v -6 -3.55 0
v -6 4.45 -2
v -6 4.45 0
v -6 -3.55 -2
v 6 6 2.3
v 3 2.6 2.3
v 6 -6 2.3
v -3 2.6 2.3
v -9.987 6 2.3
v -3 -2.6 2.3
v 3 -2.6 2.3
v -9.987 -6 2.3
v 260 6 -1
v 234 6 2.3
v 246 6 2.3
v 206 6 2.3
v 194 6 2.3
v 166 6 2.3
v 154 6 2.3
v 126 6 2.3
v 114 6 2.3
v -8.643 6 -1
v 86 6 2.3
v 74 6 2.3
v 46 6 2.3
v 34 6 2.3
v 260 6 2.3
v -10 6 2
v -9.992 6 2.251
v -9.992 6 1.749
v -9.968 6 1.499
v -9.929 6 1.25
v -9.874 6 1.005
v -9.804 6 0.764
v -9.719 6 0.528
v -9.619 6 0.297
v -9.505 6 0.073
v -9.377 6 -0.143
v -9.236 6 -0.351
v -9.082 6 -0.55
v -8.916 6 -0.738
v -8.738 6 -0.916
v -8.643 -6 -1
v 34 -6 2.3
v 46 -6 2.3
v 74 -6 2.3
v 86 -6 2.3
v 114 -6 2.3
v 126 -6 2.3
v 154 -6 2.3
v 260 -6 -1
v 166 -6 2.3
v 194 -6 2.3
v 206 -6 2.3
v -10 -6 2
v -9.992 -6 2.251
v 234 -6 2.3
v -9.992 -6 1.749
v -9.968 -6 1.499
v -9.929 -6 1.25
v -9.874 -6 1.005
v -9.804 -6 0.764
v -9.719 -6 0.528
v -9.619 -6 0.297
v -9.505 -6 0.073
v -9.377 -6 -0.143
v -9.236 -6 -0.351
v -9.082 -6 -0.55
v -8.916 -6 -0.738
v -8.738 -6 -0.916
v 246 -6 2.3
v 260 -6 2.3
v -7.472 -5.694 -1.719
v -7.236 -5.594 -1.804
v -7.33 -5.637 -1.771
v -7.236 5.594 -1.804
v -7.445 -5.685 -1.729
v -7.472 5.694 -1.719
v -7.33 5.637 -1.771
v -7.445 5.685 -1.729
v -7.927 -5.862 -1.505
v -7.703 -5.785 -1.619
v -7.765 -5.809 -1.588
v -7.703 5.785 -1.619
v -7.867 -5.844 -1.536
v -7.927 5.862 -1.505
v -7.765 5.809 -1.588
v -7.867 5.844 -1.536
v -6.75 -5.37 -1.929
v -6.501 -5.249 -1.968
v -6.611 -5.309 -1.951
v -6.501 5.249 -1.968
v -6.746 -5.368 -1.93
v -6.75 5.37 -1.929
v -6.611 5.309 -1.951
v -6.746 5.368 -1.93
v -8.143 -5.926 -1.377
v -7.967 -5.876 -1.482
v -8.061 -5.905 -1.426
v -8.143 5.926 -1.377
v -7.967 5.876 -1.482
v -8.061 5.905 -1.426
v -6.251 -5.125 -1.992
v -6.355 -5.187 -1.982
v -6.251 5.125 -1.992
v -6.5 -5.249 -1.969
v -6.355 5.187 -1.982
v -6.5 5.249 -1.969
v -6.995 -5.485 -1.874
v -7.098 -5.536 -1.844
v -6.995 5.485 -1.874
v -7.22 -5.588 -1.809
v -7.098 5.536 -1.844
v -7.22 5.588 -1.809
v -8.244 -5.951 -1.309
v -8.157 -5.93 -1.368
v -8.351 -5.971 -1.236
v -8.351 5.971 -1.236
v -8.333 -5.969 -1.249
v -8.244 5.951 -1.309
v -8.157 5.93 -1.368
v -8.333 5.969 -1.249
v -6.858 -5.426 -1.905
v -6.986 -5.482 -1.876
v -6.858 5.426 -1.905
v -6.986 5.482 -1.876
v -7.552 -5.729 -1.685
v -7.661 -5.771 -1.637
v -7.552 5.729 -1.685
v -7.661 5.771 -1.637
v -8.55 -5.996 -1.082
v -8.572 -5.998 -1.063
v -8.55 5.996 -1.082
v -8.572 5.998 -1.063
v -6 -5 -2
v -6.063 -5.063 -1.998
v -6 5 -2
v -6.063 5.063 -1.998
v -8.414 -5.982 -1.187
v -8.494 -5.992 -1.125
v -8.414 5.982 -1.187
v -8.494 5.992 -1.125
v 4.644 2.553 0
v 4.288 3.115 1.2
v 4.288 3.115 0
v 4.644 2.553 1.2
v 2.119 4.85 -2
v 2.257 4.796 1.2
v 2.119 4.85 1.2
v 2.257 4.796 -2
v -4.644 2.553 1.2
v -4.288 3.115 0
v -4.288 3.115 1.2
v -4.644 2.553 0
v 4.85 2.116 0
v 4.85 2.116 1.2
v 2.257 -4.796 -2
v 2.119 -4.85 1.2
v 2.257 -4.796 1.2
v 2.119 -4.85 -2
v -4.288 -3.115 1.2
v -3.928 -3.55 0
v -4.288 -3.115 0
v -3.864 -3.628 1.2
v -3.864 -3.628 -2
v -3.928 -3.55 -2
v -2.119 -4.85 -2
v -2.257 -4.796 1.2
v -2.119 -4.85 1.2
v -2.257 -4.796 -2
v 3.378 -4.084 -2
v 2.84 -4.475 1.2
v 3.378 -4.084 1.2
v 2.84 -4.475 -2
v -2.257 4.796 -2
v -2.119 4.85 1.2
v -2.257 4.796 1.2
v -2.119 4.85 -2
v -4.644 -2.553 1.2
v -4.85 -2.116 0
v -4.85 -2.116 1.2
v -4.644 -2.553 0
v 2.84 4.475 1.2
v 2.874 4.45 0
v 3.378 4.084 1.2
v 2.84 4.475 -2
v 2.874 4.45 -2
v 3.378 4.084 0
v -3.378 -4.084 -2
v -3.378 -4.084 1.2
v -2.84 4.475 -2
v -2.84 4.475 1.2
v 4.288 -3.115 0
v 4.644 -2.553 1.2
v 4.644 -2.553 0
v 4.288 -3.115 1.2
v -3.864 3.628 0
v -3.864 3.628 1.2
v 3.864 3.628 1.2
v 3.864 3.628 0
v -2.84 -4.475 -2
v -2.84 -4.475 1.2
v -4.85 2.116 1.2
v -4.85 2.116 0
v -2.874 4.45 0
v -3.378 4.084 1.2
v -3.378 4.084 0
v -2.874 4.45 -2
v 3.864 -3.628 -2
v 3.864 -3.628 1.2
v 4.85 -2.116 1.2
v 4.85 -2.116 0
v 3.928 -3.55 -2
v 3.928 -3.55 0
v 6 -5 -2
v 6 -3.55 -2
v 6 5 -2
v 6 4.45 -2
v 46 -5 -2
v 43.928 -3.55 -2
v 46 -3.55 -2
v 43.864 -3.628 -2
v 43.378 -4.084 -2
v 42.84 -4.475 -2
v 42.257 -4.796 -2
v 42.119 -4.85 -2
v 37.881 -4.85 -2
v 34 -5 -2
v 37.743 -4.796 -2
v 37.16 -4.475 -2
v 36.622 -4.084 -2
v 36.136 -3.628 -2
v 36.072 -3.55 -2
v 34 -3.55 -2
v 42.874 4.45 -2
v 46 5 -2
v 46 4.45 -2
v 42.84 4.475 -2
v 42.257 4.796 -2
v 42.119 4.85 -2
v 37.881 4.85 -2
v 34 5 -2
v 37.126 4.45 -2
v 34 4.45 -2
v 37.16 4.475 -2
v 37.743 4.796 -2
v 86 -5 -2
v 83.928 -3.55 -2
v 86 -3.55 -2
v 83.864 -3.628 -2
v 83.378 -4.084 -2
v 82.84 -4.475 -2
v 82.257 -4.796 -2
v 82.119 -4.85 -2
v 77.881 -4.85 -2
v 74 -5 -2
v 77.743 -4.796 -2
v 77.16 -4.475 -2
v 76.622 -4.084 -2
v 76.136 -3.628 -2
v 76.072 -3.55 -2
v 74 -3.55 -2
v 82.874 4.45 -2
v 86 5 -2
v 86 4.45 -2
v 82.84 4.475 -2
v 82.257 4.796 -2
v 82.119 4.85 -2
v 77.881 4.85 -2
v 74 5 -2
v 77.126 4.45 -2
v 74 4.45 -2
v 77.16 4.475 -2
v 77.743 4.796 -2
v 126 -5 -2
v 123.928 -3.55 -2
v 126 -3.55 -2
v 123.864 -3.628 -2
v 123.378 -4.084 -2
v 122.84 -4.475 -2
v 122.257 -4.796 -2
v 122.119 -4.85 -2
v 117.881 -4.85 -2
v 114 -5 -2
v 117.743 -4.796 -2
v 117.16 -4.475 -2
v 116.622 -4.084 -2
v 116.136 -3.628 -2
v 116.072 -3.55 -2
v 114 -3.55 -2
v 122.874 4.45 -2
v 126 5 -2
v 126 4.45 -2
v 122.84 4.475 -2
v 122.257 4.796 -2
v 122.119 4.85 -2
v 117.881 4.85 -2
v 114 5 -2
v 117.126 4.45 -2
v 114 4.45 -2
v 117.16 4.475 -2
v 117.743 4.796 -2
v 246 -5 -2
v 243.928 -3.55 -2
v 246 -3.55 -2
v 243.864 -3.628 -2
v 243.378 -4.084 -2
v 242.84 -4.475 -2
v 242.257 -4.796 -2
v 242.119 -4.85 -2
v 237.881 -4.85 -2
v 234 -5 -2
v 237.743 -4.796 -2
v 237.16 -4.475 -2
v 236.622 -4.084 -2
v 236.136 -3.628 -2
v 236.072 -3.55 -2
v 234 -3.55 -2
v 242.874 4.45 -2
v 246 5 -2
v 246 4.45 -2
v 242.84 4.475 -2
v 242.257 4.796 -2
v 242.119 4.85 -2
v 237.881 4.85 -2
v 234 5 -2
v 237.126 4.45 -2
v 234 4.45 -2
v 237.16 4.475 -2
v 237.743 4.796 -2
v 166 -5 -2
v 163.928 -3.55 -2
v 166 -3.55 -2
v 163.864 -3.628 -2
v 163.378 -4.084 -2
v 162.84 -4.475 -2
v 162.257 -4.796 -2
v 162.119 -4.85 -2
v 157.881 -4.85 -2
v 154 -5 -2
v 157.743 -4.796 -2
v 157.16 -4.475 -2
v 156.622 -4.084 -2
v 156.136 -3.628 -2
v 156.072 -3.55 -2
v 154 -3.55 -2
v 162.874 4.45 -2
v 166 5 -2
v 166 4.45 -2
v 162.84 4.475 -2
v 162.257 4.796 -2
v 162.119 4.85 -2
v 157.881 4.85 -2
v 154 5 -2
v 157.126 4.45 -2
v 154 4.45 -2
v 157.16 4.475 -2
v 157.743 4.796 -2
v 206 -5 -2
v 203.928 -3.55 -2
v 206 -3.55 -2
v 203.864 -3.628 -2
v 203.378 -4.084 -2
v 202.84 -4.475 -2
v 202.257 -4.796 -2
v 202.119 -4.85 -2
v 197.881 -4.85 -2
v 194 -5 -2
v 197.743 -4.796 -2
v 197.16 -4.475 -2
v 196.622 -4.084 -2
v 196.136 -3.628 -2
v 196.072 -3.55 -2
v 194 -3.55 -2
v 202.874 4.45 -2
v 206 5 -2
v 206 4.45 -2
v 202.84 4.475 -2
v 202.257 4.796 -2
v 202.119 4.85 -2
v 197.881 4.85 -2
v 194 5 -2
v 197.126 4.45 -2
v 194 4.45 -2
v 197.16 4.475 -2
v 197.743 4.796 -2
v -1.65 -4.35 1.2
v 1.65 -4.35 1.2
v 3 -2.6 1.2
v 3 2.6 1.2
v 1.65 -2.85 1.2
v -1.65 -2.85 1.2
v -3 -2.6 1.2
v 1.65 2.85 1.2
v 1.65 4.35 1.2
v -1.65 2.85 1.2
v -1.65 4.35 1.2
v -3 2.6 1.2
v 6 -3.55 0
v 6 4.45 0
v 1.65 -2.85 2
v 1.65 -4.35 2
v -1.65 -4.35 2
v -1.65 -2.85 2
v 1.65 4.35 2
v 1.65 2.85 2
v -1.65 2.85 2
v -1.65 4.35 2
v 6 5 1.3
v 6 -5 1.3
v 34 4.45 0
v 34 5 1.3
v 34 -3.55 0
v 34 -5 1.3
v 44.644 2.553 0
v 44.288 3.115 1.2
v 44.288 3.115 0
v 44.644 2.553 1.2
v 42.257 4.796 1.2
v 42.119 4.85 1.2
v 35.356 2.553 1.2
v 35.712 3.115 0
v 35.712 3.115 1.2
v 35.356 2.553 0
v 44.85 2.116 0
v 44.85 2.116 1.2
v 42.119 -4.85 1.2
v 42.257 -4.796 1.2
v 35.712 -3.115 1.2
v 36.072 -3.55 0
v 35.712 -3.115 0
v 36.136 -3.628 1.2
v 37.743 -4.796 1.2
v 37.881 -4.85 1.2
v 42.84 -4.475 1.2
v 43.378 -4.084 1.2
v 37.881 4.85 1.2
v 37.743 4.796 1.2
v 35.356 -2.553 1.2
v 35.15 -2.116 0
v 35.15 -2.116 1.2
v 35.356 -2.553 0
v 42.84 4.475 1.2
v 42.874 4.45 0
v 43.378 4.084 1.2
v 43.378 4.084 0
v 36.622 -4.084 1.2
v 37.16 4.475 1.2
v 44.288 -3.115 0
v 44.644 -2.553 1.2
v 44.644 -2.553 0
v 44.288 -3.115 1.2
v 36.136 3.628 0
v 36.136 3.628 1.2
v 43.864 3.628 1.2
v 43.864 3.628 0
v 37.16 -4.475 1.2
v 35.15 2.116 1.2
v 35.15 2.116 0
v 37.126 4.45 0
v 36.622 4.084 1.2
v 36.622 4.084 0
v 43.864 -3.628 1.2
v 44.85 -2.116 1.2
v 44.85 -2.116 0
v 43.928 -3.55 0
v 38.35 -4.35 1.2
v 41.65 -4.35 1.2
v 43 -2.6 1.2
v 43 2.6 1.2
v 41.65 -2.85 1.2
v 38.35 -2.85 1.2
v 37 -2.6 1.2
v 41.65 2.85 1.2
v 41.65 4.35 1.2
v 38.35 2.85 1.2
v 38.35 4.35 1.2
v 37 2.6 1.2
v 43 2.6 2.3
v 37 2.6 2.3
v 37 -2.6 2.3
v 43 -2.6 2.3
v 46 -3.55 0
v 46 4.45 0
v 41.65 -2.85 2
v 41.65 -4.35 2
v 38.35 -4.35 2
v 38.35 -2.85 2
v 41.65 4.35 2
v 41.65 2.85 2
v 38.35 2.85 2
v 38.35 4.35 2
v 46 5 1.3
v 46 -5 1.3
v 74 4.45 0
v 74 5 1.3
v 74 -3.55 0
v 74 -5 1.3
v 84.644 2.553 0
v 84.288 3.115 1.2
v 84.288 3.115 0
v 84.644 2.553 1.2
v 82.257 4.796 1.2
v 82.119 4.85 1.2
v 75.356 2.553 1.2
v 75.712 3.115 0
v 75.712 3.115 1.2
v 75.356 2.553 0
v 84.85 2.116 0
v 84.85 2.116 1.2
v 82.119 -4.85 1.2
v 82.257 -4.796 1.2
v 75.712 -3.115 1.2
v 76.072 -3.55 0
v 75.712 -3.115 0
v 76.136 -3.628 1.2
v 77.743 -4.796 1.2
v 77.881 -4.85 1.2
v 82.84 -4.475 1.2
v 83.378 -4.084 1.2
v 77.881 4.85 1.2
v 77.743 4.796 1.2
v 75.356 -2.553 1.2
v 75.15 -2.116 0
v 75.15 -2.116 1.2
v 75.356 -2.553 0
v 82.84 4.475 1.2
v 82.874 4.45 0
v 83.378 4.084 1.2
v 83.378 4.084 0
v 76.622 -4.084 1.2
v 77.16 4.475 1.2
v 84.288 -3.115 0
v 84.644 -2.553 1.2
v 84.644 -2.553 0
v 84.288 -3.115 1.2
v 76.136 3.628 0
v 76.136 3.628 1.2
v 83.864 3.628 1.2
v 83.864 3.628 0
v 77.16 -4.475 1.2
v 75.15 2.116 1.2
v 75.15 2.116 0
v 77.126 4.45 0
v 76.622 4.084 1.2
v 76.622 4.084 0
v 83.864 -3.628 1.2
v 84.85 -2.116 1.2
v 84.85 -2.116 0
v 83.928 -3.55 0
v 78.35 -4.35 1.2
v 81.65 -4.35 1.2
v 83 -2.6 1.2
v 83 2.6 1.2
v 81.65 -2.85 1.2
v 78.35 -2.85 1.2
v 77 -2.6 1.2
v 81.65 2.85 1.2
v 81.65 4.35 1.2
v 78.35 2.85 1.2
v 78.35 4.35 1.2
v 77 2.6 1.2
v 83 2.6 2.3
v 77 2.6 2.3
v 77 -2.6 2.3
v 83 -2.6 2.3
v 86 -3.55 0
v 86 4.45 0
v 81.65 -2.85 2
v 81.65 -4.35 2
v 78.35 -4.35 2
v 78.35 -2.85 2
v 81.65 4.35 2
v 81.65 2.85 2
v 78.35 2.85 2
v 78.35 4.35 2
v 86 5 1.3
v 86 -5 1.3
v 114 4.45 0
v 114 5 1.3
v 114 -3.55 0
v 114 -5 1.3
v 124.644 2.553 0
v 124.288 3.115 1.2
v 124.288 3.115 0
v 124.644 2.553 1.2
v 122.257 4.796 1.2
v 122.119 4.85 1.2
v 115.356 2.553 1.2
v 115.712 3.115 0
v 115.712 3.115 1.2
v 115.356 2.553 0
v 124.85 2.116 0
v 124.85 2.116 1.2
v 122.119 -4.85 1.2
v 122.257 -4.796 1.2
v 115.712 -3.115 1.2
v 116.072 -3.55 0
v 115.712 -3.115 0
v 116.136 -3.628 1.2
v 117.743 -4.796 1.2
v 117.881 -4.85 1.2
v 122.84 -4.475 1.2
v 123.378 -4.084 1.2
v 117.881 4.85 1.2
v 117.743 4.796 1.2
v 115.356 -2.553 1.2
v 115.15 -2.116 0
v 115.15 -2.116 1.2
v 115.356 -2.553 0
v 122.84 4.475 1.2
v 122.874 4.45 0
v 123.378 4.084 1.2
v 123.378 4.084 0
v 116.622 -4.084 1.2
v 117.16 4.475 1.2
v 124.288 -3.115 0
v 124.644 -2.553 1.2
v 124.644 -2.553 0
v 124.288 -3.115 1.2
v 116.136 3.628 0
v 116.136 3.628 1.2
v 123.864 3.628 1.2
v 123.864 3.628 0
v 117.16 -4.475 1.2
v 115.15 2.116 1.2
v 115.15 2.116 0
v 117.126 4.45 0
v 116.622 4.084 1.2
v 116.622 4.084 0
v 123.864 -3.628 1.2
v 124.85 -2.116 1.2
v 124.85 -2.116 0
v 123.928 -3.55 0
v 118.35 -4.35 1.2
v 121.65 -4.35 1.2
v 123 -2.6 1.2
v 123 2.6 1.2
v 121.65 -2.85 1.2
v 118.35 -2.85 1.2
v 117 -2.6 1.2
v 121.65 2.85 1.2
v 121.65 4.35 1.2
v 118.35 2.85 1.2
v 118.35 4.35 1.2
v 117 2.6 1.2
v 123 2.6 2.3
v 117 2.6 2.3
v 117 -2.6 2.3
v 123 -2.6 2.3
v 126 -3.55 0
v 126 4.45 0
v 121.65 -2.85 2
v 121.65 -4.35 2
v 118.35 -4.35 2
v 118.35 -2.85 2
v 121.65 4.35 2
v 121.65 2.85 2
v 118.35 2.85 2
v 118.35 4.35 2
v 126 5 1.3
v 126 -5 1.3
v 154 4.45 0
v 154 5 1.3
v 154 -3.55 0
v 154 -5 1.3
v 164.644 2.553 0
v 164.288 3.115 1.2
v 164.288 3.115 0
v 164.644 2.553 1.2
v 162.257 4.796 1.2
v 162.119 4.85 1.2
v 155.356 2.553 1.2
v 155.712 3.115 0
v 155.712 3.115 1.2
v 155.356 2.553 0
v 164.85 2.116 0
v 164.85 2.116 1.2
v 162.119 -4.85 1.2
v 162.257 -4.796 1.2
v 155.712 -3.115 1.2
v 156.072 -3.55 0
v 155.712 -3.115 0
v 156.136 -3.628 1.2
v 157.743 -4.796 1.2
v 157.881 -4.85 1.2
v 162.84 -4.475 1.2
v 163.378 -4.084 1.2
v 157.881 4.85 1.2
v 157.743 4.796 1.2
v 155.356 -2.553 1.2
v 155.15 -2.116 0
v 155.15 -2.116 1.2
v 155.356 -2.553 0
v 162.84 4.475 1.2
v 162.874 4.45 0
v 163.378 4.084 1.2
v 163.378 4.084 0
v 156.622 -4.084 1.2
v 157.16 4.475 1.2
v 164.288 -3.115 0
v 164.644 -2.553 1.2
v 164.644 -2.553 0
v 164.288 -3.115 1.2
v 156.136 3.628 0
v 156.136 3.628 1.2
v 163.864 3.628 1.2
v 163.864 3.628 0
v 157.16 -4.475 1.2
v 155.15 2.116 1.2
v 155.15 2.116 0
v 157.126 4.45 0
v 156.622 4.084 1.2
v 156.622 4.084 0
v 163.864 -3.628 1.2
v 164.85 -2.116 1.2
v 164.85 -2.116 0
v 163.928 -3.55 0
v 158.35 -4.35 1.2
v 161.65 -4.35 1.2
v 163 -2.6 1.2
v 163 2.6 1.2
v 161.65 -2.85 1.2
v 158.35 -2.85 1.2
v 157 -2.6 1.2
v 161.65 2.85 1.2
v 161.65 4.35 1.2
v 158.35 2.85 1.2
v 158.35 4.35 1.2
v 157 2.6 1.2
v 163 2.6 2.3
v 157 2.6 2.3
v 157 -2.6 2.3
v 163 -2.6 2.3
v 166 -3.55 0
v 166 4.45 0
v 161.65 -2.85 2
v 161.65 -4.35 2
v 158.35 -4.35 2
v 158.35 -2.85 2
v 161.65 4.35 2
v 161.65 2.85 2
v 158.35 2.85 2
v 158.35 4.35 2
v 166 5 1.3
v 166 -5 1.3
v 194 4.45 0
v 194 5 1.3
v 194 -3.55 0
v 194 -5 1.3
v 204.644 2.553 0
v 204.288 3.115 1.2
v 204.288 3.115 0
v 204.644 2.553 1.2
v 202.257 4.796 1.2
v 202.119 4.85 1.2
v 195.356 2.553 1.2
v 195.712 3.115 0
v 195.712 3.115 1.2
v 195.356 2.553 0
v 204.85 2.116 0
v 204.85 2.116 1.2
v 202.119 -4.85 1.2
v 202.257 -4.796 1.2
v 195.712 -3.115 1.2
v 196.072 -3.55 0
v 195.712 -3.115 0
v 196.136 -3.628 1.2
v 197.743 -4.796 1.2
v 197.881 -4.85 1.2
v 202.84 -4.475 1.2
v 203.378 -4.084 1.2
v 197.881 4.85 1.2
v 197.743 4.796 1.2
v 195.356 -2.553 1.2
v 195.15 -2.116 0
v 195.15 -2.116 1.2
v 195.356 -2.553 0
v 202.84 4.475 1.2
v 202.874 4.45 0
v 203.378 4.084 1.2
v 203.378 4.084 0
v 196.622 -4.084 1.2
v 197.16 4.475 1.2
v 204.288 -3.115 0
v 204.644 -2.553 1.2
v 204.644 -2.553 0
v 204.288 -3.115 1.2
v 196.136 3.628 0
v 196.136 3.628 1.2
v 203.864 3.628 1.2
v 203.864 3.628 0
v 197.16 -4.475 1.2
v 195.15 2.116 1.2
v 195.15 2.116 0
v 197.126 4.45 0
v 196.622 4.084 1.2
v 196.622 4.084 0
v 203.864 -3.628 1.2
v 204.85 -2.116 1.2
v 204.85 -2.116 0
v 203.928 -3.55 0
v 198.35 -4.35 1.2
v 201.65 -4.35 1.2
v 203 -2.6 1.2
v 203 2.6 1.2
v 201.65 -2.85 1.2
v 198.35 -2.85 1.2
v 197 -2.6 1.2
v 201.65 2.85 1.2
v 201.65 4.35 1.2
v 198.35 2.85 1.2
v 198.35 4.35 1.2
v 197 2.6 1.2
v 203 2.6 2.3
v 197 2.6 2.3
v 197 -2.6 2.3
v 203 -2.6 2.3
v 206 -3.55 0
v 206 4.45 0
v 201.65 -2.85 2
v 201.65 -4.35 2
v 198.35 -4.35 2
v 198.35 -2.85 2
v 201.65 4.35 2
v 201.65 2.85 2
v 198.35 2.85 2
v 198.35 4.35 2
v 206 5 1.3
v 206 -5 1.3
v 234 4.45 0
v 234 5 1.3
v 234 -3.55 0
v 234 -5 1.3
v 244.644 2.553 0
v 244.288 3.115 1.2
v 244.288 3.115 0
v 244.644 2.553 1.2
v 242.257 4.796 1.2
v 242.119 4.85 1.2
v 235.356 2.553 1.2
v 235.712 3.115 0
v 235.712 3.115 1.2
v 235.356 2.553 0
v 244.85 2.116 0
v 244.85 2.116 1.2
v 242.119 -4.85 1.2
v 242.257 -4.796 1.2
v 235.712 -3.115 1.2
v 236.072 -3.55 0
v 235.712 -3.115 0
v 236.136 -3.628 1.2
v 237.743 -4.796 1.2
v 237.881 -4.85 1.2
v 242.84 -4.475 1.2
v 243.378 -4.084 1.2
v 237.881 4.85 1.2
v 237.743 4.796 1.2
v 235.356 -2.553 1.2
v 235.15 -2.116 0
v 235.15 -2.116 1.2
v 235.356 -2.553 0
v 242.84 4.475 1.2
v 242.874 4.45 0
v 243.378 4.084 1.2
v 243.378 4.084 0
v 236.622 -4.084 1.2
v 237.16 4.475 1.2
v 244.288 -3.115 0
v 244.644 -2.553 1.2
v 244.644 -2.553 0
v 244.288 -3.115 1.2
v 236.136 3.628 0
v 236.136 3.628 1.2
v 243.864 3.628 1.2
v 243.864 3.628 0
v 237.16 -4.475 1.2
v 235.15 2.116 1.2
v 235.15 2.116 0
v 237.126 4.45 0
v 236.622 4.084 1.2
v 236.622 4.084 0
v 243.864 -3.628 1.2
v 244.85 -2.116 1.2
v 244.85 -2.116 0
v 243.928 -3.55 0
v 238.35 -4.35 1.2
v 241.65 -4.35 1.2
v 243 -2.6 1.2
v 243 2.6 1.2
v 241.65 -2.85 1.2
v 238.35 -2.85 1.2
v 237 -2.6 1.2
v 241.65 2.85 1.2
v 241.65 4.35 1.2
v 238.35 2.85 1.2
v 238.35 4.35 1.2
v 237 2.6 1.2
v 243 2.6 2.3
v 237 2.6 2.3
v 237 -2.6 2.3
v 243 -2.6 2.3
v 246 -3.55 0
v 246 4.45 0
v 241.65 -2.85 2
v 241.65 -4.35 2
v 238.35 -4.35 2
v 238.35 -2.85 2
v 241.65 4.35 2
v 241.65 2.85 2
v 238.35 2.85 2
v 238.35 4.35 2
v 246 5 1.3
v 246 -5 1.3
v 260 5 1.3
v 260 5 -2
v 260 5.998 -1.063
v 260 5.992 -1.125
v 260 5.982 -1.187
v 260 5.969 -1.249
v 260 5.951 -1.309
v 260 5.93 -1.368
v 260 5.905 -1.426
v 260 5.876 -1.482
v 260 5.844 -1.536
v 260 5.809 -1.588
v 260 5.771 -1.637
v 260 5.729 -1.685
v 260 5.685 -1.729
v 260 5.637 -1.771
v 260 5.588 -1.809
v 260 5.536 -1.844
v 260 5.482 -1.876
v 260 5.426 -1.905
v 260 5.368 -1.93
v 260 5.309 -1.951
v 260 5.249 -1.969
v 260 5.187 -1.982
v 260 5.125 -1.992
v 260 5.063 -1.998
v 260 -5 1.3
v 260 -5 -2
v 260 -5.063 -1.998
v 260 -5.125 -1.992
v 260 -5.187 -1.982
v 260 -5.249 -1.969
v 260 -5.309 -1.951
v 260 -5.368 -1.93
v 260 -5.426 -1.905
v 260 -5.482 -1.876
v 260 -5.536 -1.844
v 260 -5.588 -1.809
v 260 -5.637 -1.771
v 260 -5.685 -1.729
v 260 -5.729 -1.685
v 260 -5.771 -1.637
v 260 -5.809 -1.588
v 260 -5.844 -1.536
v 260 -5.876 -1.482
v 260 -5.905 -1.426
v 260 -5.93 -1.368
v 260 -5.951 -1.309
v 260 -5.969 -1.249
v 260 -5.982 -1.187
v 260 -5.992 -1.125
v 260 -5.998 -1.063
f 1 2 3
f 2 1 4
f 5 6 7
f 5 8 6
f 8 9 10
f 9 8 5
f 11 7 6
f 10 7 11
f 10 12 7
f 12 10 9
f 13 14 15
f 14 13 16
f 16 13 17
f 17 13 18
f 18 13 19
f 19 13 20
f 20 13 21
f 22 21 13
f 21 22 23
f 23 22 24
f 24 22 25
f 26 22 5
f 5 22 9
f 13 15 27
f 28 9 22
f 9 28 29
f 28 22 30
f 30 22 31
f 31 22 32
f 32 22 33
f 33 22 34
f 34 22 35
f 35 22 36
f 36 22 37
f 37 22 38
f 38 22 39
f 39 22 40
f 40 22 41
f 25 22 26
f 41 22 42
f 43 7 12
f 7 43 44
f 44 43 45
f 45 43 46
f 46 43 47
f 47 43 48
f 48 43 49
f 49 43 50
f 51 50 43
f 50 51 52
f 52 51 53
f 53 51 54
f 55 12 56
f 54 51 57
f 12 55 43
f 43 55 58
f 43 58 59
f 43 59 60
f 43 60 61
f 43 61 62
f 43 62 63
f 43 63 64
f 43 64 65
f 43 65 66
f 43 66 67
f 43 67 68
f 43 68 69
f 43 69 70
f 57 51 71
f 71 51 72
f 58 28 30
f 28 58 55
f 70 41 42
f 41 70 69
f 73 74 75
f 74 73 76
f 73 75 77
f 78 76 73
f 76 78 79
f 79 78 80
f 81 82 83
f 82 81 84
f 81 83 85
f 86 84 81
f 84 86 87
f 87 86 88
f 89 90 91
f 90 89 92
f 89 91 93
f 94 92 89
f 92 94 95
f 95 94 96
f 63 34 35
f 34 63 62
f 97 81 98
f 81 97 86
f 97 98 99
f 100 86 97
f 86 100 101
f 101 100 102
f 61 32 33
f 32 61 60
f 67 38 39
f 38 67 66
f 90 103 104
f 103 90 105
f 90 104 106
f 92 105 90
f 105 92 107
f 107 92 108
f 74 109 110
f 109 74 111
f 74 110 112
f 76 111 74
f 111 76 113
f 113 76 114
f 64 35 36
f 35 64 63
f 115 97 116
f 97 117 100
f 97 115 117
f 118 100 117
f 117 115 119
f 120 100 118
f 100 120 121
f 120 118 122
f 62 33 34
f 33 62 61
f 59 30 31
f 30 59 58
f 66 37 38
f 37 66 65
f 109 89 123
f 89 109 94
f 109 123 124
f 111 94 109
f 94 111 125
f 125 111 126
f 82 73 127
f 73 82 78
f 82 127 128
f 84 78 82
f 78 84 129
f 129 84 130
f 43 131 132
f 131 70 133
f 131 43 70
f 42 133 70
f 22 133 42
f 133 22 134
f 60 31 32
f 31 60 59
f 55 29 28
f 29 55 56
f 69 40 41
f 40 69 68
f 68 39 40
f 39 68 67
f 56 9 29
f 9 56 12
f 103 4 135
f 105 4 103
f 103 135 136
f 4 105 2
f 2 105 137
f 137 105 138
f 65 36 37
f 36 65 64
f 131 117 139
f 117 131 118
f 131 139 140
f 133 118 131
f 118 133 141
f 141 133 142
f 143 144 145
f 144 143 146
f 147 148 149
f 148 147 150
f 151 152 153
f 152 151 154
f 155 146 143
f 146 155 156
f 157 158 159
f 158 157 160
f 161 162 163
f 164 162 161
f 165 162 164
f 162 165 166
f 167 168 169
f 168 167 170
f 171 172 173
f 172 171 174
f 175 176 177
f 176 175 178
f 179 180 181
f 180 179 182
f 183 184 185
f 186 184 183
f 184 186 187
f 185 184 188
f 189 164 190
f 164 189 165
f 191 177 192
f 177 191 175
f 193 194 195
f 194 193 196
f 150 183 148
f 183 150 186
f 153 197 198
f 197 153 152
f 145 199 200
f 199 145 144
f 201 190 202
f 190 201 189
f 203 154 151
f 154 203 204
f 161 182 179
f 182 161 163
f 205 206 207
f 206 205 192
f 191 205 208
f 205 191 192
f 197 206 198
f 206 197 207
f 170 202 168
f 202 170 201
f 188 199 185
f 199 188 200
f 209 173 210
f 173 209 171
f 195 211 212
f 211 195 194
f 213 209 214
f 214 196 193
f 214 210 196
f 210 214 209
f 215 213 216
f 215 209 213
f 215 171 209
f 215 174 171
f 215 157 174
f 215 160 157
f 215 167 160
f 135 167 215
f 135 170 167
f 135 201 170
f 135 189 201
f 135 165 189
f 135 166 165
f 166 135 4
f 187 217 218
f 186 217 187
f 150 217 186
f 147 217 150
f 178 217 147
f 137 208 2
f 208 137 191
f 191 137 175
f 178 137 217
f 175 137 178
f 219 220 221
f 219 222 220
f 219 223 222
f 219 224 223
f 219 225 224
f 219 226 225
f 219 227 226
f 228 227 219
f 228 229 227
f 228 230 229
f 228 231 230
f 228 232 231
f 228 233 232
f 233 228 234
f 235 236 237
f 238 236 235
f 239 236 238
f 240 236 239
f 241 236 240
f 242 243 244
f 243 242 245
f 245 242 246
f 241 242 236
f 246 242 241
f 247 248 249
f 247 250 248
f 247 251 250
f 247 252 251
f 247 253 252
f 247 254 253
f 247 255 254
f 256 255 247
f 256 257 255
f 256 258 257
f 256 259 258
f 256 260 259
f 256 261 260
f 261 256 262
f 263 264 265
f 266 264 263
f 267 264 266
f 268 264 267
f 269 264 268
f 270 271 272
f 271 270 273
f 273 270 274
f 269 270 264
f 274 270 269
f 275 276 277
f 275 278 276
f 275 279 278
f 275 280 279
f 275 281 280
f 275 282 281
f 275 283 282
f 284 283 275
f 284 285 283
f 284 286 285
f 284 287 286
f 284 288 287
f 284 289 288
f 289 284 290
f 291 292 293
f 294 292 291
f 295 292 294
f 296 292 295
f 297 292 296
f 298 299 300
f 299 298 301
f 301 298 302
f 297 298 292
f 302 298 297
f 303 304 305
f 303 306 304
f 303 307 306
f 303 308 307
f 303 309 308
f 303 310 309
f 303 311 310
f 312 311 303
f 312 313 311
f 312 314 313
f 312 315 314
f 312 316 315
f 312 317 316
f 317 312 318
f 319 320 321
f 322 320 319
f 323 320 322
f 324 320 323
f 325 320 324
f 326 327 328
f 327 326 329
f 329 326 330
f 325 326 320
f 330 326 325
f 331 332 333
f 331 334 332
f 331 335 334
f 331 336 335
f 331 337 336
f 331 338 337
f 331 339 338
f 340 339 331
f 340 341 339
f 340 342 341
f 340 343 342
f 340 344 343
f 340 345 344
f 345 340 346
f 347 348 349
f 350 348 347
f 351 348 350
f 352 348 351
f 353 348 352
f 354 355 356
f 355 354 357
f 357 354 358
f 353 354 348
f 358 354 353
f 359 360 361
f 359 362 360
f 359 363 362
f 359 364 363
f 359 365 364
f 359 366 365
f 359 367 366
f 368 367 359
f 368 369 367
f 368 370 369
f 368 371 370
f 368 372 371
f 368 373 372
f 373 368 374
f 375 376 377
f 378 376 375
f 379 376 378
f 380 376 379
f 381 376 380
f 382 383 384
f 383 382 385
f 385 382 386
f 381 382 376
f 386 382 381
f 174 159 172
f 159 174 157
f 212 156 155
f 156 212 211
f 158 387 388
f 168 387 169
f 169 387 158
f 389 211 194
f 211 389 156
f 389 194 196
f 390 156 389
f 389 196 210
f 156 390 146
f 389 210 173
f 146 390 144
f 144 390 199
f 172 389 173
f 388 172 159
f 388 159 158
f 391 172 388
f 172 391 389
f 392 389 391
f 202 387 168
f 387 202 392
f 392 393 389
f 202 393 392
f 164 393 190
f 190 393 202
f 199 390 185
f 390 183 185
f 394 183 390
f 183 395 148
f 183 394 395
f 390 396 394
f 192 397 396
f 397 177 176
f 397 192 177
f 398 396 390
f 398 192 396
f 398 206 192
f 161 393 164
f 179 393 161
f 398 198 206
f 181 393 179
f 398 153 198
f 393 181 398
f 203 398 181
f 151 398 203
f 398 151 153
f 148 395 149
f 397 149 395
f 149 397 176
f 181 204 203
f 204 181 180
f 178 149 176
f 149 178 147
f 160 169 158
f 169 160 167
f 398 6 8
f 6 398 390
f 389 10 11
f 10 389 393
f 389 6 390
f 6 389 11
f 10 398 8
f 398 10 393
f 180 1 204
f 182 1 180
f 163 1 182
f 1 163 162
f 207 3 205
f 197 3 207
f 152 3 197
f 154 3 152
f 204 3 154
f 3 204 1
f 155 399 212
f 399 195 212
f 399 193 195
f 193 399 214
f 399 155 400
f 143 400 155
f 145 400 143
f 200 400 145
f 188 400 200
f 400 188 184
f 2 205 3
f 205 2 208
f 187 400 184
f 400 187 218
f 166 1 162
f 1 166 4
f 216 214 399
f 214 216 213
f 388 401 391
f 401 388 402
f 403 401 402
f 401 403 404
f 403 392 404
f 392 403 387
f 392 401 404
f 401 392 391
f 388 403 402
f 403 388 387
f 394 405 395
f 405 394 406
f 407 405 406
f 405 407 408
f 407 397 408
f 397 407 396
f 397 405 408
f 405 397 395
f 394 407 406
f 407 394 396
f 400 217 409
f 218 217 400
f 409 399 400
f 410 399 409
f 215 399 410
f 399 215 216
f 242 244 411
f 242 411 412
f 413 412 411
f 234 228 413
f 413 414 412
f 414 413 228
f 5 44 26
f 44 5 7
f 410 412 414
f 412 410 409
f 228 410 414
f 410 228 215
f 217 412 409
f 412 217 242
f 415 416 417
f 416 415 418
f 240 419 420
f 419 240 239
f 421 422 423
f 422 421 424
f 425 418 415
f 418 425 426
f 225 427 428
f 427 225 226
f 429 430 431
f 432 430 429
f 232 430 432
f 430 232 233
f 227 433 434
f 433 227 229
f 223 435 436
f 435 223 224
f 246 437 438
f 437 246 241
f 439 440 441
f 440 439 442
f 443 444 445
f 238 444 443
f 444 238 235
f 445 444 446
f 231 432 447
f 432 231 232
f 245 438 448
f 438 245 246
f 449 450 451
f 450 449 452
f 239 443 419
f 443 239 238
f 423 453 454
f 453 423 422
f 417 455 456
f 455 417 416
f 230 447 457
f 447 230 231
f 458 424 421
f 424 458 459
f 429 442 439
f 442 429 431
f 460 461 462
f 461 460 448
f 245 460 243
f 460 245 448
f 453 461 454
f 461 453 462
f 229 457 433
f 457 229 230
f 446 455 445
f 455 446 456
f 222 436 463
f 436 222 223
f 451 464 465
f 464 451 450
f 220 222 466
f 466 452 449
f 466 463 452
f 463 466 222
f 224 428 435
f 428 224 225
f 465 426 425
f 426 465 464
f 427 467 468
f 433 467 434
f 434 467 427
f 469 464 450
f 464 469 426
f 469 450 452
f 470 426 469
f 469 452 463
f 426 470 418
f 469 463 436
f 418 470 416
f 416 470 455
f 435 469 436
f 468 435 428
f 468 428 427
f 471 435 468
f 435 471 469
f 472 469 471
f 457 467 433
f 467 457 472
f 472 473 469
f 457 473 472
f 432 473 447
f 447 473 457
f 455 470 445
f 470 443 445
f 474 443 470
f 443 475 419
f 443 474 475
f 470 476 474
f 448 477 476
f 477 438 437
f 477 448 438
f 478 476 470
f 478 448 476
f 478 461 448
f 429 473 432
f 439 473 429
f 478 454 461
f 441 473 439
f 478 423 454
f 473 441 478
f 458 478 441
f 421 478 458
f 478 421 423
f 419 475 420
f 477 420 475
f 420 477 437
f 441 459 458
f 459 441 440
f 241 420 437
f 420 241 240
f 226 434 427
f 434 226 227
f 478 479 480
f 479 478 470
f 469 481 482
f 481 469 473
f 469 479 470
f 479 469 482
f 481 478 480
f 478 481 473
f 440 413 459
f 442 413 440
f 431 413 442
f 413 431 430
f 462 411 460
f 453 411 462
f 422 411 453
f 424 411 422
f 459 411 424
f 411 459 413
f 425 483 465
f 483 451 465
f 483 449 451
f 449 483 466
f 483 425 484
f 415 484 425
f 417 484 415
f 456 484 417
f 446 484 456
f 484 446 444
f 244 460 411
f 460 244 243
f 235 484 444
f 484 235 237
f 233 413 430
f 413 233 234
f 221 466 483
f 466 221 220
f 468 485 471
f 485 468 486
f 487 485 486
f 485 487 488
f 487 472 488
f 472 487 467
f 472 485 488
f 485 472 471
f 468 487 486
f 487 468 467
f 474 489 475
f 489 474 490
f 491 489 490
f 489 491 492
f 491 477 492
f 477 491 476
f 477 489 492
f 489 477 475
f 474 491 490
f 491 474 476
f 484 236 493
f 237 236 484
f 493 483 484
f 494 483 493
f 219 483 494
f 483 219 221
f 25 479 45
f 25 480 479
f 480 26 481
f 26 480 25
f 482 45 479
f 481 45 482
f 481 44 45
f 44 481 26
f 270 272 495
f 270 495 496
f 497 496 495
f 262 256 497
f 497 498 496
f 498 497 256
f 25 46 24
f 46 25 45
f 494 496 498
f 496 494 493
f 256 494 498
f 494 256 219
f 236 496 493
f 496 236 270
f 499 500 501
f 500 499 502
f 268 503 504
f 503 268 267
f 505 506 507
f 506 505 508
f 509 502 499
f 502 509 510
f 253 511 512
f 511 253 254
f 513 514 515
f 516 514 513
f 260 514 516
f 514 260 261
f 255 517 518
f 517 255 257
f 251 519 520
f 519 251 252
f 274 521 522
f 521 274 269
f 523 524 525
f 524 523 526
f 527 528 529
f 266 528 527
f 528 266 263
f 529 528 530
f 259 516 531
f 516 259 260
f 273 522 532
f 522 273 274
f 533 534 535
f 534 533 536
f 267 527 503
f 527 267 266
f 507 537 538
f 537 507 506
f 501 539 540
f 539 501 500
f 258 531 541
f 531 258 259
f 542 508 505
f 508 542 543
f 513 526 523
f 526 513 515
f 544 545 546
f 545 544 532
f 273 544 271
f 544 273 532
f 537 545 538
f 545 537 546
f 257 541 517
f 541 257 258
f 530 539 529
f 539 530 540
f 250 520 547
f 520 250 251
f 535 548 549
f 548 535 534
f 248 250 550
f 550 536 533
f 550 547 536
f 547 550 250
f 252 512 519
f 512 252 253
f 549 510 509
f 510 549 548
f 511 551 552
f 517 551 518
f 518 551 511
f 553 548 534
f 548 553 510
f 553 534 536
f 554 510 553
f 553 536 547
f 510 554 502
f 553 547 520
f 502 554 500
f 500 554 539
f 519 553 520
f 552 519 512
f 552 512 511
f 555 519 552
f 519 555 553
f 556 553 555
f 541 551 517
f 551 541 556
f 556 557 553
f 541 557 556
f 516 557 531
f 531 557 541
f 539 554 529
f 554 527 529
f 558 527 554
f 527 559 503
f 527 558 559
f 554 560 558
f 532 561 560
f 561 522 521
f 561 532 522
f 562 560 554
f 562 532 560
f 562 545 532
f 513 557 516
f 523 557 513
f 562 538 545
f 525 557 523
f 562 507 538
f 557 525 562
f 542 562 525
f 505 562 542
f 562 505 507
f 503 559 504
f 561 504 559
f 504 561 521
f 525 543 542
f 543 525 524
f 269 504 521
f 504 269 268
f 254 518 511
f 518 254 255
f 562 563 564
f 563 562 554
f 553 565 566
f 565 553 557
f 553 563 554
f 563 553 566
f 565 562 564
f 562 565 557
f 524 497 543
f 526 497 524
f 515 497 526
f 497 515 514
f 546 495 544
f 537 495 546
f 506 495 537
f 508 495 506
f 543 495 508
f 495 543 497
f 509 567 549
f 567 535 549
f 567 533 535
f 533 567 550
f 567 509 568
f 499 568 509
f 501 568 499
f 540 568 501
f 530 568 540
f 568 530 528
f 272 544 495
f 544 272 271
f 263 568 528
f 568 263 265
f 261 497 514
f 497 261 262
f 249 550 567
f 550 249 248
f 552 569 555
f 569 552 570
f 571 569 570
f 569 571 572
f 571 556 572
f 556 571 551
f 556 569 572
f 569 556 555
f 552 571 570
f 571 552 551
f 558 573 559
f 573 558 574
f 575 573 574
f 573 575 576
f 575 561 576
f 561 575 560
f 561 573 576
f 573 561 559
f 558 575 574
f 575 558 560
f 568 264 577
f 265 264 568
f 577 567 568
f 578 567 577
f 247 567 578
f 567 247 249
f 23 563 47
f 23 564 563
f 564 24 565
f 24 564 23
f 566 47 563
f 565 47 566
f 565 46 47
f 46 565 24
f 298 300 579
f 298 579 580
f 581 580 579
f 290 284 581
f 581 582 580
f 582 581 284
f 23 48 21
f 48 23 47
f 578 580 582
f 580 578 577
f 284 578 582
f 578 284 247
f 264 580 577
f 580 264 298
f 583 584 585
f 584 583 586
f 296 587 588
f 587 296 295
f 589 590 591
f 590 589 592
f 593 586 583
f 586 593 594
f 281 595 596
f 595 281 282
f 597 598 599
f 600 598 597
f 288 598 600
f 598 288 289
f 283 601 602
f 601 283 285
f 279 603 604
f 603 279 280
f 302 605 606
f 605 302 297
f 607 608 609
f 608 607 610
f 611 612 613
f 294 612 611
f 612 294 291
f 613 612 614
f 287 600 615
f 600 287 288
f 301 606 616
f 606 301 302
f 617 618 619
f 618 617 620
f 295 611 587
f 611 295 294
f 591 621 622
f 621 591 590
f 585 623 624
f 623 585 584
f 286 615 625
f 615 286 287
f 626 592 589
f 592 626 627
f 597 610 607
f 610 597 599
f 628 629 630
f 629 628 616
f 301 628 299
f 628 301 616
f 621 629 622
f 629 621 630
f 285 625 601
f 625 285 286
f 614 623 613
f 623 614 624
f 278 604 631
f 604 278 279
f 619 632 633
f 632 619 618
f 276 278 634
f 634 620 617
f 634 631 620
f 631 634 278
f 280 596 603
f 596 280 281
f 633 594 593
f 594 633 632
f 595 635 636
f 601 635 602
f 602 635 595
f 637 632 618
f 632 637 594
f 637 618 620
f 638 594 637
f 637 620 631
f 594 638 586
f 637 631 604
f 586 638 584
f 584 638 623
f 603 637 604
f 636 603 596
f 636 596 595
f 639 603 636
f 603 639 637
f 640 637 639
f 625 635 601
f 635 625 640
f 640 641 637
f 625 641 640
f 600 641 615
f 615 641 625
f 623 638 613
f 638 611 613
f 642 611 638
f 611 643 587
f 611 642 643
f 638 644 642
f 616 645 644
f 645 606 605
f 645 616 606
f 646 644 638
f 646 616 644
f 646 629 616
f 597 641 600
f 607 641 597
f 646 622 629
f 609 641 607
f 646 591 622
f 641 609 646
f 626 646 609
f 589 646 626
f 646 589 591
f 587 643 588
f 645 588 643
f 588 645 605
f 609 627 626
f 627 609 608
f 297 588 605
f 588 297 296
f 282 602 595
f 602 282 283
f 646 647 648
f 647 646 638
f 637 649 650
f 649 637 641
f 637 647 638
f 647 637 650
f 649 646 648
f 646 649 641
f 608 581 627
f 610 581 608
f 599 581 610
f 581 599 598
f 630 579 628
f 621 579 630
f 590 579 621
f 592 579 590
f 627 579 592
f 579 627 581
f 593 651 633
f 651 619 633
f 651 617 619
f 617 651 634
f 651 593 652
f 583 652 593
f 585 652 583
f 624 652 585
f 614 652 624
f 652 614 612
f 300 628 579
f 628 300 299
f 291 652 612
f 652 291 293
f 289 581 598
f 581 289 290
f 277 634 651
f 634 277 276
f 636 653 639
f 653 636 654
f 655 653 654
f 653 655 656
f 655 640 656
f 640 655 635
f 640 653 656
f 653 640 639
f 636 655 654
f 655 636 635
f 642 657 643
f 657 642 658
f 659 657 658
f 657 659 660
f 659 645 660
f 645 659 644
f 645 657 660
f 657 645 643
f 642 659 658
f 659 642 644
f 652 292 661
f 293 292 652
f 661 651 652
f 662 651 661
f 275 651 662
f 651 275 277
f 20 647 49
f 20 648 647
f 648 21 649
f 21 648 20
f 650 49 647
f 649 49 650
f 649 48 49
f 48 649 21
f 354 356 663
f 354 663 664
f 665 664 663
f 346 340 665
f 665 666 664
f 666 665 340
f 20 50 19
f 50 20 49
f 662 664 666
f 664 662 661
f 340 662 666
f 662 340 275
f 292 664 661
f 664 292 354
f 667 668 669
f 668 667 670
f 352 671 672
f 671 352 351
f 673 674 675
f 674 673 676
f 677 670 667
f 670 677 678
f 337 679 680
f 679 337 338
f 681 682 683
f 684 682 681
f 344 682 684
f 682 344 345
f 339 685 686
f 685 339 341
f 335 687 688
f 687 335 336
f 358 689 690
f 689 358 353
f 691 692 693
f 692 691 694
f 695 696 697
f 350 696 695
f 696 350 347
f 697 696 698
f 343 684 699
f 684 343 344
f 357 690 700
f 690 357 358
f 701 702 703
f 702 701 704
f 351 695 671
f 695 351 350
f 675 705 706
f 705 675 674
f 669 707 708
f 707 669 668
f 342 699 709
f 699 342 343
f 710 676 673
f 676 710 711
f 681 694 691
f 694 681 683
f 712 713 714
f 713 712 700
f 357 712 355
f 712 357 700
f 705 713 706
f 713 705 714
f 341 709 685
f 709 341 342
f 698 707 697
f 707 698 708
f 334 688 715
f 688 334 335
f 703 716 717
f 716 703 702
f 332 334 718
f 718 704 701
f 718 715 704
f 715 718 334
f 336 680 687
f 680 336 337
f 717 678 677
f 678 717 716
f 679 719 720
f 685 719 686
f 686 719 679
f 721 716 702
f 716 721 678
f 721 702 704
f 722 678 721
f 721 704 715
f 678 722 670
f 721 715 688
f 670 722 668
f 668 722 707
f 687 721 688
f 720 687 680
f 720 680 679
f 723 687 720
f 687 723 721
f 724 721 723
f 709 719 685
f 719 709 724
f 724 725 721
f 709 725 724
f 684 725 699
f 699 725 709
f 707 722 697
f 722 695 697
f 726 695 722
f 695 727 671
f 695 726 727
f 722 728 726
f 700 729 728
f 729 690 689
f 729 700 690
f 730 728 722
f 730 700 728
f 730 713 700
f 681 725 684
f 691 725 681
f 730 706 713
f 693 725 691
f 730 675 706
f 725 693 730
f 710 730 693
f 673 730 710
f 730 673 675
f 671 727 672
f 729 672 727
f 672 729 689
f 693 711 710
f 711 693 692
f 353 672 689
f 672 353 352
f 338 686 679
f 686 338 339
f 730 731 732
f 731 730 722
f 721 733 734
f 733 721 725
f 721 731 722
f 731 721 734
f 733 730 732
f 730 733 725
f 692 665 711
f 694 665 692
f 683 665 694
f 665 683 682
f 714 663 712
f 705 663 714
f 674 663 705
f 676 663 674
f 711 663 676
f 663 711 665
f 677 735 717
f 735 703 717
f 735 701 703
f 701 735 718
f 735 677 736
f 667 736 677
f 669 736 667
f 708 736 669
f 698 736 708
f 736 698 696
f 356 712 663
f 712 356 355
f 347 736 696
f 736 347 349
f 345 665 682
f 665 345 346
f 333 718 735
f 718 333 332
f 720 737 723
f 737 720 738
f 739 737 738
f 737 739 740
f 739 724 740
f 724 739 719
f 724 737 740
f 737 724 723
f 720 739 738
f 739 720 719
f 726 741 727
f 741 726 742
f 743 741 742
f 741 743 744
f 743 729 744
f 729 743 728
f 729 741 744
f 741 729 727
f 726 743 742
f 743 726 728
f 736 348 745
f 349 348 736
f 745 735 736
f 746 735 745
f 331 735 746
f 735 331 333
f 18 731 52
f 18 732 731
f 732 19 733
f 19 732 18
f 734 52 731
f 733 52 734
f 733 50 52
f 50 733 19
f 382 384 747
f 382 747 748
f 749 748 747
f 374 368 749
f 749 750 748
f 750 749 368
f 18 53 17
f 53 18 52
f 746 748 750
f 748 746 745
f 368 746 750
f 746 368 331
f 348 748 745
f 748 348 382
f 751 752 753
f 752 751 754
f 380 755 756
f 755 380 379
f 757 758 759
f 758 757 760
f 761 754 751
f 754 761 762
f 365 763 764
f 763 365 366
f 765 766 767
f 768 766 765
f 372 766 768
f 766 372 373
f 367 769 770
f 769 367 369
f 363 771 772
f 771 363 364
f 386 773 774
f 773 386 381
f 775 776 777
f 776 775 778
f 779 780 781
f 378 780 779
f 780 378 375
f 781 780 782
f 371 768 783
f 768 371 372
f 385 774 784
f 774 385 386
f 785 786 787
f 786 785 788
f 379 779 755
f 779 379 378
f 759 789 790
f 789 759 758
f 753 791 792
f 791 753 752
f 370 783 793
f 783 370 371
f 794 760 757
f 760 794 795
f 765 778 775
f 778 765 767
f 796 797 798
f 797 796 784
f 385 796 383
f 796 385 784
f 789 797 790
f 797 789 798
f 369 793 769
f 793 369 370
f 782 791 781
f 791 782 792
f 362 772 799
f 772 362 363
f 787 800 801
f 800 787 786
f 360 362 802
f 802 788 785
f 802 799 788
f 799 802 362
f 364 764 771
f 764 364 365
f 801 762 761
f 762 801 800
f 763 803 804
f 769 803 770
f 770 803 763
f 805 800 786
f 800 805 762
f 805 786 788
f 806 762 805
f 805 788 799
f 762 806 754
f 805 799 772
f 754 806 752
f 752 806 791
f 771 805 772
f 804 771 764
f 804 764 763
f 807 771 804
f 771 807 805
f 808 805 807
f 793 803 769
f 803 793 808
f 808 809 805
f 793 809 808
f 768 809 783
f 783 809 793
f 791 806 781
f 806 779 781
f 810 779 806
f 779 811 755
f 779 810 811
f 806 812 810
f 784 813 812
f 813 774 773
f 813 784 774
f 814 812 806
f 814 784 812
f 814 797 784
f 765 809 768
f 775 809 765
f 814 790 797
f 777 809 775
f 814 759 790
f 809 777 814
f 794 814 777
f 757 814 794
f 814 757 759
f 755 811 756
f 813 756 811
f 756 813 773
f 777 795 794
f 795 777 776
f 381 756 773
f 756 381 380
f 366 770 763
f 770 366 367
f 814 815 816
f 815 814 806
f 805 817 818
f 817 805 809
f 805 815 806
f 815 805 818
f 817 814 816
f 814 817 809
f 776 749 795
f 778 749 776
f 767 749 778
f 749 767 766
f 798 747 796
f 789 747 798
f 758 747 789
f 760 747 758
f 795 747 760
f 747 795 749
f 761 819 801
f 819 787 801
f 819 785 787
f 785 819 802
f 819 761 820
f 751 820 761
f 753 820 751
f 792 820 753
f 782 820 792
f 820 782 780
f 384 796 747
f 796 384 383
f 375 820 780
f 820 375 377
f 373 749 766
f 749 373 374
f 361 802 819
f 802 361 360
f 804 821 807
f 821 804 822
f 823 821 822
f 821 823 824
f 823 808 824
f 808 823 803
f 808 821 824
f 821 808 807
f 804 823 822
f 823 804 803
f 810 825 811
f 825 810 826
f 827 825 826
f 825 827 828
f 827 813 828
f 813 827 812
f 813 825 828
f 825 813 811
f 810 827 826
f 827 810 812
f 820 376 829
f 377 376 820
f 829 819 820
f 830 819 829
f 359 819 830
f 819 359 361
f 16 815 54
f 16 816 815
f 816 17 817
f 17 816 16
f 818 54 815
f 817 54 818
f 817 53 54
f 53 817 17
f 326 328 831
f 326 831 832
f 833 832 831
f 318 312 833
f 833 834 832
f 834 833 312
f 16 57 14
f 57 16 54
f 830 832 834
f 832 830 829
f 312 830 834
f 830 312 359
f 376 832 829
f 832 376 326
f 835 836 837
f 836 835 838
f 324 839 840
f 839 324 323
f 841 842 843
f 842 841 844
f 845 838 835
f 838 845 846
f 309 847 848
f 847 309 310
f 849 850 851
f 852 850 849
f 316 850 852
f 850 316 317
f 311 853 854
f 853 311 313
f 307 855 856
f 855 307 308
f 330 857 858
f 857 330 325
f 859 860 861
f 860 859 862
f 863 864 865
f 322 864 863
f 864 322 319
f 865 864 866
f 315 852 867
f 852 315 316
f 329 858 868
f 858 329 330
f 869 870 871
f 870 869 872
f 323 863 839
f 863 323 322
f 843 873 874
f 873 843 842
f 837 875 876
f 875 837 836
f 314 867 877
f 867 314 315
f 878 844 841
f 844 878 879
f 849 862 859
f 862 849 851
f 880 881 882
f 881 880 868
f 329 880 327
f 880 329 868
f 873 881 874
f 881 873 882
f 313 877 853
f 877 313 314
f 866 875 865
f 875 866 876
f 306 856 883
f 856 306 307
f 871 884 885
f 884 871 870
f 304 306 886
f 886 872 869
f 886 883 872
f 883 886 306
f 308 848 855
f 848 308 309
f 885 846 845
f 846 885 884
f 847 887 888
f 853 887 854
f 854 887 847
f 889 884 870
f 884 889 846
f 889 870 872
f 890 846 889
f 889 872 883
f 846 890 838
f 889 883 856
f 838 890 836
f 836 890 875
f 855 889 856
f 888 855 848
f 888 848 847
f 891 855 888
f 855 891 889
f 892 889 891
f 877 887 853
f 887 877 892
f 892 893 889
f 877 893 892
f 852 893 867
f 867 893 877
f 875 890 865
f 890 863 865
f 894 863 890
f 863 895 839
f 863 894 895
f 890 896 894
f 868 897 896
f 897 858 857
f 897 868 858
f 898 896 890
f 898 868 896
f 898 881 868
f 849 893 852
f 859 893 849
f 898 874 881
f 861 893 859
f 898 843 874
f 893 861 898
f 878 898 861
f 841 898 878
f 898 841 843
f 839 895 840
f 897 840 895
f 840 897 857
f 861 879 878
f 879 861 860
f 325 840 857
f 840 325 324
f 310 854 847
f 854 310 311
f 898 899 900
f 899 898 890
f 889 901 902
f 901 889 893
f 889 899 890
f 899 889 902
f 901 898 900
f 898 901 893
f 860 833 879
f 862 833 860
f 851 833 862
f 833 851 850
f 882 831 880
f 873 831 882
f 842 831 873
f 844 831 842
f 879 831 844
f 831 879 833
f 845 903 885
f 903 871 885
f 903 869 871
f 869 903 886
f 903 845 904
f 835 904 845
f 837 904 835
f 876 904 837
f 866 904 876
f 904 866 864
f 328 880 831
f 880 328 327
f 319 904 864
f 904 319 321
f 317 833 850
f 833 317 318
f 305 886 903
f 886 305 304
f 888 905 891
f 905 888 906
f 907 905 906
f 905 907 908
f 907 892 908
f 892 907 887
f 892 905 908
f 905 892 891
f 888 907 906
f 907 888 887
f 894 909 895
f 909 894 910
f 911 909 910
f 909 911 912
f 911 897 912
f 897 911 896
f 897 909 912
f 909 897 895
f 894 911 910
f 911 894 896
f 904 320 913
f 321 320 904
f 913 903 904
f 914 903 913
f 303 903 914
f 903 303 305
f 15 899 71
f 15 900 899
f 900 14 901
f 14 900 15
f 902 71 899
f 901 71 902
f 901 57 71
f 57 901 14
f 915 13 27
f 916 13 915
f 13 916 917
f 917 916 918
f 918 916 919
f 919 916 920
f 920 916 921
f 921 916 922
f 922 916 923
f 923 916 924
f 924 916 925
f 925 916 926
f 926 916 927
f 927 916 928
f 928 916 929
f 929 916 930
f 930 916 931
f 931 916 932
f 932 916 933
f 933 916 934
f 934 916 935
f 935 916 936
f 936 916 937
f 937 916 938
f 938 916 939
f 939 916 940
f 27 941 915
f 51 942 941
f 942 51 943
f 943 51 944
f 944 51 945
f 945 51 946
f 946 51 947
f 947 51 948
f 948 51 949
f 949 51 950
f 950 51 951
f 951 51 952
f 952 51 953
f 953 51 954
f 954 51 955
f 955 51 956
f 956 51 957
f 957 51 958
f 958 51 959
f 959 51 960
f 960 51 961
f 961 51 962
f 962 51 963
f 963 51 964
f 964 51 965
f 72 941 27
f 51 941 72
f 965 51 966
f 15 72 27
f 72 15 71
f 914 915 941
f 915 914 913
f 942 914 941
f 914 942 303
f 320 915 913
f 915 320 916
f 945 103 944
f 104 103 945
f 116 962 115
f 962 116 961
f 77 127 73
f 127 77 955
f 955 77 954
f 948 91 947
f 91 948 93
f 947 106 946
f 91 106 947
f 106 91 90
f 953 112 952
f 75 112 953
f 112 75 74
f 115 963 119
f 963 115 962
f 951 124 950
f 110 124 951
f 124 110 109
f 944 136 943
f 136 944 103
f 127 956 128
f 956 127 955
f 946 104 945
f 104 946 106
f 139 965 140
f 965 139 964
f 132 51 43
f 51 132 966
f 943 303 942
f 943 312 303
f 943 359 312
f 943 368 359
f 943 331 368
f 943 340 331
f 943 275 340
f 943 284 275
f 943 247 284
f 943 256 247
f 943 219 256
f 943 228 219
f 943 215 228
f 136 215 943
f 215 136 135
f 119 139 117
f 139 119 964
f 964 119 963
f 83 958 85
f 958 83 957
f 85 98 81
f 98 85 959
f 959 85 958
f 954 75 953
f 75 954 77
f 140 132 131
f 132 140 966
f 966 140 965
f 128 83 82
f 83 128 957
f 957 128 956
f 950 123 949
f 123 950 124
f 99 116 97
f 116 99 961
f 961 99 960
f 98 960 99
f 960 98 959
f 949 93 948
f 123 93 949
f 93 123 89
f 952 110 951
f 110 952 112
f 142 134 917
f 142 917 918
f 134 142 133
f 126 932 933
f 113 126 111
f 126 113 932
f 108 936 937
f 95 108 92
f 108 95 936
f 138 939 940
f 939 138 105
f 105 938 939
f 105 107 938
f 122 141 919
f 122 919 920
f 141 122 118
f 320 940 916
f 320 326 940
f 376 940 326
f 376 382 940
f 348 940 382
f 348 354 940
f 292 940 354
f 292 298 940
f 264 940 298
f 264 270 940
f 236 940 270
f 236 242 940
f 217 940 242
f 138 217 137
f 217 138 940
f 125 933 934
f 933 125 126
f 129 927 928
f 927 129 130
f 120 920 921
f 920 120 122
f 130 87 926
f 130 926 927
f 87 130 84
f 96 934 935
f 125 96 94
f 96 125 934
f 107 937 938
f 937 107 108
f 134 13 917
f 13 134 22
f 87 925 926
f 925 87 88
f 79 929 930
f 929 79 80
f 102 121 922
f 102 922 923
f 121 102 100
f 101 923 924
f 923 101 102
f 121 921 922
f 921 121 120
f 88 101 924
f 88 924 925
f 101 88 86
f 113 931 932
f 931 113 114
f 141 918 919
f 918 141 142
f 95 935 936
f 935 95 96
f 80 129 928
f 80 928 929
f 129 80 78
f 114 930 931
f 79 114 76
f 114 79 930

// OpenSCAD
// A tray you can push those little Neopixel circut boards into
// see https://kigyui.com/ledskirt/

// This is a postive of the circuit board of a ws2812
module ws2812() {
    translate ([-9.7/2,-9.7/2,0]) { 
        intersection() {
            translate([9.7/2,9.7/2,-2]) cylinder(r=5.3,h=2.8+2,$fn=50);
            translate([0,0,-2]) cube([9.7,9.7,2+1.2]); // size of pcb
        }
        translate([9.7/2,9.7/2,2.9/2]) cube([5.6,5.2,2.9],center=true);    // 5050 but we have to clear the solder lugs so do 60,52
        translate([9.7/2,9.7/2,2.9/2]) cube([6.0,5.2,5],center=true);
        translate([-10,1.3,-2]) cube([30,8,2]);
        // cap and resistor
        translate([9.7/2,1.25,2.0/2]) cube([3.3,1.5,2],center=true);
        translate([9.7/2,9.7-1.25,2.0/2]) cube([3.3,1.5,2.0],center=true);
    }
}

// Generate a negative for it to fit into
module ws2812unit() {    
    difference() {
        translate([-6,-6,-2]) cube([12,12,4.3]);
        ws2812();
    }
}

module straight(start,slen) {
        translate([start,-6,1.3]) { 
            cube([slen,12,1]);
            translate([0,0,-3.3])cube([slen,1,3.3]);
            translate([0,11,-3.3])cube([slen,1,3.3]);
        }    
}

//translate([-10,12,0]) cube([270,1,1]);

difference() {
    union() {
        // curved front to tray
        intersection() {
        translate([-12,-6,-2])cube([6,12,4.3]);
        translate([-6,6,2])rotate([90,0,0])cylinder(h=12,r=4,$fn=100);
        }
        ws2812unit();   

        *union () {  // a 6 equalish spread piece
        gap = 37;
        straight(6,gap);
        l2 = gap+12;
        translate([l2,0,0])    ws2812unit();   
        straight(6+l2,gap);
        l3 = l2 + gap+12;
        translate([l3,0,0])    ws2812unit();   
        straight(6+l3,gap);
        l4 = l3 + gap+12;
        translate([l4,0,0])    ws2812unit();          
        straight(6+l4,gap);
        l5 = l4 + gap+12;
        translate([l5,0,0])    ws2812unit();     
        straight(6+l5,gap);
        l6 = l5 + gap+12;
        translate([l6,0,0])    ws2812unit();    
        straight(6+l6,270-l6-6-10);
        }
        
        union () {  // a 7 equalish spread piece
        gap = 28;
        straight(6,gap);
        l2 = gap+12;
        translate([l2,0,0])    ws2812unit();   
        straight(6+l2,gap);
        l3 = l2 + gap+12;
        translate([l3,0,0])    ws2812unit();   
        straight(6+l3,gap);
        l4 = l3 + gap+12;
        translate([l4,0,0])    ws2812unit();          
        straight(6+l4,gap);
        l5 = l4 + gap+12;
        translate([l5,0,0])    ws2812unit();     
        straight(6+l5,gap);
        l6 = l5 + gap+12;
        translate([l6,0,0])    ws2812unit();    
        straight(6+l6,gap);
        l7 = l6 + gap+12;
        translate([l7,0,0])    ws2812unit();                
        straight(6+l7,270-l7-6-10);
        }        
   }
    // smooth the top corners
    union() {
        translate([-40,-5,-1]) difference() {
            translate([0,-1,-1]) cube([300,1,1]);
            rotate([90,0,90]) cylinder(r=1,h=300,$fn=100);
        }
        translate([-40,5,-1]) difference() {
            translate([0,0,-1]) cube([300,1,1]);
            rotate([90,0,90]) cylinder(r=1,h=300,$fn=100);
        }
    }
}

*translate([10,2,0]) rotate([180,0,0])linear_extrude(height=.15) {
    text("Yui 2018",size=5,$fn=16);
}
